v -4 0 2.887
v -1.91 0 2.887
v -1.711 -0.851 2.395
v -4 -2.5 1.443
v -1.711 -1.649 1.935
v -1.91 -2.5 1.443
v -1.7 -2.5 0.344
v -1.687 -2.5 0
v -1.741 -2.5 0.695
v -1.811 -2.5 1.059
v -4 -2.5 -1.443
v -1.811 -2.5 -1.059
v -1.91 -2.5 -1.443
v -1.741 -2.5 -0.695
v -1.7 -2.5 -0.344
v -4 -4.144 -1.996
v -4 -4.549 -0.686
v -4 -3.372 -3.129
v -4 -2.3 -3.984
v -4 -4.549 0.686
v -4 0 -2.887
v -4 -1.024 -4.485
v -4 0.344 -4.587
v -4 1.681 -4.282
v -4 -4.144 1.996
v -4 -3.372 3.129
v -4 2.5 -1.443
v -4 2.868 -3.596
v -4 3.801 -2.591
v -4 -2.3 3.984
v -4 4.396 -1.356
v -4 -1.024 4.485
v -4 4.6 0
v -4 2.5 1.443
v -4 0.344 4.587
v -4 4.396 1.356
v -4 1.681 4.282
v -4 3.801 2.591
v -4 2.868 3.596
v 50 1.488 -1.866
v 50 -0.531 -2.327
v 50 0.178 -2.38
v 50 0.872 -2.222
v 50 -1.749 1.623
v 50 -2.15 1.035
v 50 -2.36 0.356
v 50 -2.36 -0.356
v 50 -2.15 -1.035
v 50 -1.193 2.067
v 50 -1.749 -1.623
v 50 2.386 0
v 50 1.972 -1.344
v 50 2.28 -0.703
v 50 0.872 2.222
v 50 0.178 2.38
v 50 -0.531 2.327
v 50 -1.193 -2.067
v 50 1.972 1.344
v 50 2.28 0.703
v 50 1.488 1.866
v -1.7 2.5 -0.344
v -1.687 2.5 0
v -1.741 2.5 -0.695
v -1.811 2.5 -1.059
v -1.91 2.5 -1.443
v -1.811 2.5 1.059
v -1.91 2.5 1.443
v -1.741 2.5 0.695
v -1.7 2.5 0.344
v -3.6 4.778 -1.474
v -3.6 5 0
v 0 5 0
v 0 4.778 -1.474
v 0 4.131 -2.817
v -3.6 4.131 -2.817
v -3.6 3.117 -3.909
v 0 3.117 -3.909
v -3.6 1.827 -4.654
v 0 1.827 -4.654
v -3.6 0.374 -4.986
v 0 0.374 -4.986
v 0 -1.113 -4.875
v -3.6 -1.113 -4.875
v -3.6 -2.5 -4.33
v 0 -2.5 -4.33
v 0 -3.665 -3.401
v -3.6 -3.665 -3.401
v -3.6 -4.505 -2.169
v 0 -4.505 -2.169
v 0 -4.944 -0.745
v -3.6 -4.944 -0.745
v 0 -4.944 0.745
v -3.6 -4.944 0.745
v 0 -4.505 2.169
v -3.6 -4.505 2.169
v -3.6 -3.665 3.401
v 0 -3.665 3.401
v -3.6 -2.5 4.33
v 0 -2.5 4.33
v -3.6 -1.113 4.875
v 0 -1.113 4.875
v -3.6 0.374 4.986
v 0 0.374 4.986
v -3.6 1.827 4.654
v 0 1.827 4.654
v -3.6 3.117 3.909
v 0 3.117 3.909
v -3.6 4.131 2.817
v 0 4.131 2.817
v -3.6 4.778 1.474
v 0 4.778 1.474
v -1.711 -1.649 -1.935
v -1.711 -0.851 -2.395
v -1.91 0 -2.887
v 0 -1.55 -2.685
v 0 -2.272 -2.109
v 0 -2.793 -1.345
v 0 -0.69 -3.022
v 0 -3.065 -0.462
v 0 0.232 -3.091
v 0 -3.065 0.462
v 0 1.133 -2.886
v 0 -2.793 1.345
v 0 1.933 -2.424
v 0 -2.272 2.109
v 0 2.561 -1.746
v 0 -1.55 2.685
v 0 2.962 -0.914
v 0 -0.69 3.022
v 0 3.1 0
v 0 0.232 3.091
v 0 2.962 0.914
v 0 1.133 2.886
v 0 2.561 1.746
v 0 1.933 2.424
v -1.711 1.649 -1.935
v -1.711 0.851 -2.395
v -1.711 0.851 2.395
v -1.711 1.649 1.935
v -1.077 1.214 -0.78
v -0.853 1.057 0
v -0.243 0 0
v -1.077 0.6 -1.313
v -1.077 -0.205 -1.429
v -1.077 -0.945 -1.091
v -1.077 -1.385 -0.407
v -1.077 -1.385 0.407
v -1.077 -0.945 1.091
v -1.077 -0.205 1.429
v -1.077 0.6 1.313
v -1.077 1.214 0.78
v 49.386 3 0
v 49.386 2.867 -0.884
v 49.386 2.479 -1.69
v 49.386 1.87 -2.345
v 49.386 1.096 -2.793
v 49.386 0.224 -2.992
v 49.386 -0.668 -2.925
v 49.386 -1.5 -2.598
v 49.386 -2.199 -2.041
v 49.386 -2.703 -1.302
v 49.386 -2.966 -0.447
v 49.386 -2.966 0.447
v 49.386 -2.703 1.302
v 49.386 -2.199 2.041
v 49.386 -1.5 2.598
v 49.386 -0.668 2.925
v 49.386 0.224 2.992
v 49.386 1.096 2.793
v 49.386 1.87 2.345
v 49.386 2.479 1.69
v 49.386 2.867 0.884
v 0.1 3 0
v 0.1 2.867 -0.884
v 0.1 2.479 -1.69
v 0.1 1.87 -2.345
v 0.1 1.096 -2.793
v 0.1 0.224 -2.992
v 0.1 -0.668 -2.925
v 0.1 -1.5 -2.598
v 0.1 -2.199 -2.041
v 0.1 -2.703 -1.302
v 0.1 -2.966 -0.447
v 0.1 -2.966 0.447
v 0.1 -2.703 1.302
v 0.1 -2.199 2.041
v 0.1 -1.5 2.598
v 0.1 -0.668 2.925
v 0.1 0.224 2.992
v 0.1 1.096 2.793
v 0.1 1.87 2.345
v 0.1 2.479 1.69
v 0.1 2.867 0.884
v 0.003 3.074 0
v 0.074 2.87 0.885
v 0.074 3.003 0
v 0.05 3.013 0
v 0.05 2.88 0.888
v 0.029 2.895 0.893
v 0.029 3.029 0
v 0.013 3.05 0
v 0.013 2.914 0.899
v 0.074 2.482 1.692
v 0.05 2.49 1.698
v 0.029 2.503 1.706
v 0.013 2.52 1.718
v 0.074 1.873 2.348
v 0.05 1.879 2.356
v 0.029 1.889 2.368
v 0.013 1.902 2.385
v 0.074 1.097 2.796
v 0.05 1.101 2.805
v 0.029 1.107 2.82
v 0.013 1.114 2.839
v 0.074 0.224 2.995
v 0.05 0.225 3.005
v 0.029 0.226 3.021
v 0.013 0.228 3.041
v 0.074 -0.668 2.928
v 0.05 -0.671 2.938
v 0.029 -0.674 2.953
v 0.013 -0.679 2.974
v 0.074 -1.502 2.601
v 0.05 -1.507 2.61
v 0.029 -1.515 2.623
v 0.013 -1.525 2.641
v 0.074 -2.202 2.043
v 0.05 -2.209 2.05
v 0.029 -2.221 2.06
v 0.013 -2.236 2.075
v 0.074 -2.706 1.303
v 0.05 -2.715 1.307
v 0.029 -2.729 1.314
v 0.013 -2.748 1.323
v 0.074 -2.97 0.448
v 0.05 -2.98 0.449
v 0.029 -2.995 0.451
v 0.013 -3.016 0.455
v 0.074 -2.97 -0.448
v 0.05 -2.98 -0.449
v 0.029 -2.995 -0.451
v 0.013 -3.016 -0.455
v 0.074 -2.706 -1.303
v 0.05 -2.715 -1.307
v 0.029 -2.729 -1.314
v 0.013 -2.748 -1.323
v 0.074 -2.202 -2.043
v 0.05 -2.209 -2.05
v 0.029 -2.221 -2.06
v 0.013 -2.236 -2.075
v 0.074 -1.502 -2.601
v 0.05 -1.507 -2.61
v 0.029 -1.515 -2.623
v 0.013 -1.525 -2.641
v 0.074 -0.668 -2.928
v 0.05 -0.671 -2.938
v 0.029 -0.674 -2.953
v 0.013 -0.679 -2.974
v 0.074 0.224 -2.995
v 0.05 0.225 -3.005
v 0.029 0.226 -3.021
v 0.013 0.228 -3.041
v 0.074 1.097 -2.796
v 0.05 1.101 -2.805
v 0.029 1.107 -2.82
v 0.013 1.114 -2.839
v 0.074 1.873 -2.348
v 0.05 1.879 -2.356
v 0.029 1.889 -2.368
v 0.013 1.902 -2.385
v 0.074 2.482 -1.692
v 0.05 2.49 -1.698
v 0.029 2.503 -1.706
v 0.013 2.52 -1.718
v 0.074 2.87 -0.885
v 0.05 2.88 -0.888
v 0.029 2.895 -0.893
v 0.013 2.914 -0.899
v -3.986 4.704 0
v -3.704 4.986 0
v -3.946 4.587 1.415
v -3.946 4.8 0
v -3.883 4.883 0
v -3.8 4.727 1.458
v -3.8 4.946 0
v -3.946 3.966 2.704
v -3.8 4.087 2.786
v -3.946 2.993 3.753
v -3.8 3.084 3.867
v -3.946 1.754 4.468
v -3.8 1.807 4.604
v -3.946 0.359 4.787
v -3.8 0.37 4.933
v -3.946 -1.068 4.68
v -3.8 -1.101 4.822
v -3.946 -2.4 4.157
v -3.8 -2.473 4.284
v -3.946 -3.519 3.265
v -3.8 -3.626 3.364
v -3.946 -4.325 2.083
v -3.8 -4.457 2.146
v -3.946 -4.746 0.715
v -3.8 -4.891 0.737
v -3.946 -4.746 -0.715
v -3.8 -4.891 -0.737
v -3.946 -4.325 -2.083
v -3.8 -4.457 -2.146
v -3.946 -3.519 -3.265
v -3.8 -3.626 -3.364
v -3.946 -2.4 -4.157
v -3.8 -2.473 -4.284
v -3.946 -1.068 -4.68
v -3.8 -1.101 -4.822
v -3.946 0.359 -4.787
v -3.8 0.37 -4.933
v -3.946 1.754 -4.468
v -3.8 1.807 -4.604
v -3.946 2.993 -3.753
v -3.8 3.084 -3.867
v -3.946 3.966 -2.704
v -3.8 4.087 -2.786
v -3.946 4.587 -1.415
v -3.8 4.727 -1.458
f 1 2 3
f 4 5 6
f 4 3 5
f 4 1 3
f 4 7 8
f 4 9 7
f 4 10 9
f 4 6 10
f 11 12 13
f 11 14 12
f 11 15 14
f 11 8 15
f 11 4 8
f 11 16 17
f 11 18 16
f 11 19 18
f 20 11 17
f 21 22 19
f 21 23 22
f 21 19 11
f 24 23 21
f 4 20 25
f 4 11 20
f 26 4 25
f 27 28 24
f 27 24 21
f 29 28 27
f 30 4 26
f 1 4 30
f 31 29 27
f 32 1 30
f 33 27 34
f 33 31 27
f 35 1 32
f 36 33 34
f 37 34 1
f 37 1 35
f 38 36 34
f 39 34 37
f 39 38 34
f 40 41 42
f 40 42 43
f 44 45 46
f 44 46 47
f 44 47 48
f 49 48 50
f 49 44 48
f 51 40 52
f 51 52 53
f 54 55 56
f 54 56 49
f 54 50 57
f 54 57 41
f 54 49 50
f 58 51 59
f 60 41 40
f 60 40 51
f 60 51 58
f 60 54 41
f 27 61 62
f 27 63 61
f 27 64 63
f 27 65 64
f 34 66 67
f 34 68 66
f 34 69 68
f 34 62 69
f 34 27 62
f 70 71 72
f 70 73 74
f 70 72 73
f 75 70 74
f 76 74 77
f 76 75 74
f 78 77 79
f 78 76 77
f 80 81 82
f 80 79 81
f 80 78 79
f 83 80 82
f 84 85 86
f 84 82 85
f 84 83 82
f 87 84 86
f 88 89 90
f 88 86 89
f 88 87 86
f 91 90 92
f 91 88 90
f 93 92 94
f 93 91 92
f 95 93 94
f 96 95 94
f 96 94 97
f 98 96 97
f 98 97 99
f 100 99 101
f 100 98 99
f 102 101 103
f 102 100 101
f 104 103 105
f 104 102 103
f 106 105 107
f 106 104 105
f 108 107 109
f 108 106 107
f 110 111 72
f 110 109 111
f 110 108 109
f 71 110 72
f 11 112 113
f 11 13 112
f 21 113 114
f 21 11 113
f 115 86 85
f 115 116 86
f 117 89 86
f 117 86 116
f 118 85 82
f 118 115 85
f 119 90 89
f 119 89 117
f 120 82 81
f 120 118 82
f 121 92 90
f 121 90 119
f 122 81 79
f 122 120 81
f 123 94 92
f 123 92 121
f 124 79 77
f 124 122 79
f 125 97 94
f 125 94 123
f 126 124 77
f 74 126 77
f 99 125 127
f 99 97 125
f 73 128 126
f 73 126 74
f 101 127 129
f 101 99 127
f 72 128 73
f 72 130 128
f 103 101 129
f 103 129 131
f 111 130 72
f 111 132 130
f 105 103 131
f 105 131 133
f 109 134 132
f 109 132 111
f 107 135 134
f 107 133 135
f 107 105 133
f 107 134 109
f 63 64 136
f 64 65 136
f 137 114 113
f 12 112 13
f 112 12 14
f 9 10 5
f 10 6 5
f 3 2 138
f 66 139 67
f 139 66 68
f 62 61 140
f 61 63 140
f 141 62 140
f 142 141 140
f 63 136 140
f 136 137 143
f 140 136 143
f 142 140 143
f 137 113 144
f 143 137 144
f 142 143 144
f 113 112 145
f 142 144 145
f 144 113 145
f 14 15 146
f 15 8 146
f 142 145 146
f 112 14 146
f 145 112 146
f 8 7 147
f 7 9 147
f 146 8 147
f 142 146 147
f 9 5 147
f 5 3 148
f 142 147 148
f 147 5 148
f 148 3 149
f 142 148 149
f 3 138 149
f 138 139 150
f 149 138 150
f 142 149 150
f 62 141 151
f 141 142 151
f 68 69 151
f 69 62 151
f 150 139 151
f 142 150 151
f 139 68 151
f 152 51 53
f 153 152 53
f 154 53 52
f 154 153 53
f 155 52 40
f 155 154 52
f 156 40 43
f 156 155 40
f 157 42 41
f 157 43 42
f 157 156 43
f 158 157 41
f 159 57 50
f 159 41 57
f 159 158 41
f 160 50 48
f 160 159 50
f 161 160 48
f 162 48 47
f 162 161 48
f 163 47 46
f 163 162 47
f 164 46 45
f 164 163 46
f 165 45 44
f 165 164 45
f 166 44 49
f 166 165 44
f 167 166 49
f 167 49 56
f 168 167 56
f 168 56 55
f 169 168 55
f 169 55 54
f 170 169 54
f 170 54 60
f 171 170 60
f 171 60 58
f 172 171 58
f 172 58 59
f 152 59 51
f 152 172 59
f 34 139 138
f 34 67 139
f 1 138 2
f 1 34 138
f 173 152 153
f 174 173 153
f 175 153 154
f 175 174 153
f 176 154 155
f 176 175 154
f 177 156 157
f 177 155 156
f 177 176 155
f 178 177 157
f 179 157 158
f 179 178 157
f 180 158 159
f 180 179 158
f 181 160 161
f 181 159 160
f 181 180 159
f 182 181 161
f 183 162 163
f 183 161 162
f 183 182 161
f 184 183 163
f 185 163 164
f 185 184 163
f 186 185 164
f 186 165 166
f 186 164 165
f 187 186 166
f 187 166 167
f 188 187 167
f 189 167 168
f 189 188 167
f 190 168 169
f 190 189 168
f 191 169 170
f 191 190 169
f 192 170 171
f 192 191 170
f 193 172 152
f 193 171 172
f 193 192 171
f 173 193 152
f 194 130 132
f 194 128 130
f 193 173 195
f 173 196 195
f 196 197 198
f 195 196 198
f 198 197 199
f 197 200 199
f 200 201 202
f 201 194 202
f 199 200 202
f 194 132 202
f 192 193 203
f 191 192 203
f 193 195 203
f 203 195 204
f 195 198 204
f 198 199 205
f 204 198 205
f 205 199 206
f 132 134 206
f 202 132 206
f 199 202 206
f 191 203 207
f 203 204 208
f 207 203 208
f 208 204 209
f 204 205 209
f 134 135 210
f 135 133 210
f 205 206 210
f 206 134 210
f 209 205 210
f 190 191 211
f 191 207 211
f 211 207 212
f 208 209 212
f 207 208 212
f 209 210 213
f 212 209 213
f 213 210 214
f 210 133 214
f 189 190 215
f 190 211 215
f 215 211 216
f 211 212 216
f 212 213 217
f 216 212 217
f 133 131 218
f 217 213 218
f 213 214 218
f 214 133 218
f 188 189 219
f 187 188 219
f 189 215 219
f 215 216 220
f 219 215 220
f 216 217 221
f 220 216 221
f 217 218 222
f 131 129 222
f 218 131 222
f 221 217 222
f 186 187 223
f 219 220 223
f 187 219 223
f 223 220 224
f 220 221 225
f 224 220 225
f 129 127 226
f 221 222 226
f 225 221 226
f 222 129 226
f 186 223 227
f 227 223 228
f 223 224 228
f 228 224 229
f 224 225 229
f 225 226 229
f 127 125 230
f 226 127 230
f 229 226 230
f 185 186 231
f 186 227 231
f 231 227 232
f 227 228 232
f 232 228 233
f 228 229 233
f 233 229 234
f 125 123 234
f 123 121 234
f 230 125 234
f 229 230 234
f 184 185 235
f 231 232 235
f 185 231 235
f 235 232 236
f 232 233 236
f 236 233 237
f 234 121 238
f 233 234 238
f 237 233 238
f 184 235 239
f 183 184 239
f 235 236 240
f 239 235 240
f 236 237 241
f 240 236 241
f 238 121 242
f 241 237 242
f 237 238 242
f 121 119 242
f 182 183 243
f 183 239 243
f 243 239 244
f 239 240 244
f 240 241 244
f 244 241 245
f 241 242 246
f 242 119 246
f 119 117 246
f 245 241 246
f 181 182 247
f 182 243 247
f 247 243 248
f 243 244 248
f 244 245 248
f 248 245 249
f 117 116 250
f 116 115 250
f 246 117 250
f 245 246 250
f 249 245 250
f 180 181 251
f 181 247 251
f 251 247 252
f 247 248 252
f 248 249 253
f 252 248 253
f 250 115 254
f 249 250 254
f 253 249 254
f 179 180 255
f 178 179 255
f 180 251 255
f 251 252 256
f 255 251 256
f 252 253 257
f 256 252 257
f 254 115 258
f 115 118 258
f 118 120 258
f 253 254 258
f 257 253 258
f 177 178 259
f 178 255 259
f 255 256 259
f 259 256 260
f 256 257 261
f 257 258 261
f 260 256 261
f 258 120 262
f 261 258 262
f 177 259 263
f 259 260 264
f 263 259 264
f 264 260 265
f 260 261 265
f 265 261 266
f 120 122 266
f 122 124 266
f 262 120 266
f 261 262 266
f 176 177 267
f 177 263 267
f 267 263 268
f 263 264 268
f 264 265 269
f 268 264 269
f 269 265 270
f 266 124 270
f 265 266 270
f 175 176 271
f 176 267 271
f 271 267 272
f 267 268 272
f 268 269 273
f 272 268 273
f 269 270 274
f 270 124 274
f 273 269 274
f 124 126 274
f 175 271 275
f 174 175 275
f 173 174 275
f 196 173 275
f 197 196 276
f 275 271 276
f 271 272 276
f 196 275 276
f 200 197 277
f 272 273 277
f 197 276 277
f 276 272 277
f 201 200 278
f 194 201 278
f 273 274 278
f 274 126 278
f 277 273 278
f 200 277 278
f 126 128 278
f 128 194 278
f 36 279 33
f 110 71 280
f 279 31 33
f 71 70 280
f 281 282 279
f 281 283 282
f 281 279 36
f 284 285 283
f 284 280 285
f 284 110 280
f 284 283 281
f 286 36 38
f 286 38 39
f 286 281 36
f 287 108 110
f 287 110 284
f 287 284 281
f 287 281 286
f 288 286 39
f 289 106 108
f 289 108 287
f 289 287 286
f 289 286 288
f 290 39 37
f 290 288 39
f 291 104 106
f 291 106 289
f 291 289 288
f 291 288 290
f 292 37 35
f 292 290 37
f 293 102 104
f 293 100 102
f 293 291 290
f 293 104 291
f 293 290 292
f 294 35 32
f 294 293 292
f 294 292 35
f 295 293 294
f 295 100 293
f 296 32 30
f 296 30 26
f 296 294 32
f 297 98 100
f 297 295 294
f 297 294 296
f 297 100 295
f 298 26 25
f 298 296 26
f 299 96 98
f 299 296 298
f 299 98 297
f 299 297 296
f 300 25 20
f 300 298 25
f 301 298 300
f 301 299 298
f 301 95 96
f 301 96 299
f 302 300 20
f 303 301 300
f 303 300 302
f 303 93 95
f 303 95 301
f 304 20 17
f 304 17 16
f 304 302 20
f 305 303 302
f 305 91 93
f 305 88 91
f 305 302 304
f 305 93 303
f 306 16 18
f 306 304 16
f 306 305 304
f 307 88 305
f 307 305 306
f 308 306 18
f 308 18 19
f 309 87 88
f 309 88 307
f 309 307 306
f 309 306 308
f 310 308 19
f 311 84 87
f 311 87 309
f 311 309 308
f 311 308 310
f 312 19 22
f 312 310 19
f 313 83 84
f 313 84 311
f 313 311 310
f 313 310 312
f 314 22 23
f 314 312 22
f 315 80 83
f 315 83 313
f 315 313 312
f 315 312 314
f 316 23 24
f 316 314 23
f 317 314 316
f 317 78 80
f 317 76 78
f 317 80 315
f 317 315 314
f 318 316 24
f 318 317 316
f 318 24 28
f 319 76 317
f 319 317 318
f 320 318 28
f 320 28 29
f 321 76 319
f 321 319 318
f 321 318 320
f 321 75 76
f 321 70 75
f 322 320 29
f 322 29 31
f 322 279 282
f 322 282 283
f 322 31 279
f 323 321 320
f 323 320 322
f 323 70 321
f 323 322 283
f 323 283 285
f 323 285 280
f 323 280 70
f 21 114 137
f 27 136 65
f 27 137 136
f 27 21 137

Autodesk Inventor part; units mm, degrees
ref_plane "YZ Plane" through (0, 0, 0) normal (1, 0, 0) x (0, 1, 0)
ref_plane "XZ Plane" through (0, 0, 0) normal (0, 1, 0) x (-1, 0, 0)
sketch "Sketch1" plane through (0, 0, 0) normal (0, 0, 1) x (1, 0, 0)
  line L0 (-0.2433, 0) -> (50, 0)
  line L1 (50, 0) -> (50, 3)
  line L2 (50, 3) -> (26, 3)
  line L3 (26, 3) -> (25.3864, 3)
  line L4 (25.3864, 3) -> (0, 3)
  line L5 (0, 3) -> (0, 5)
  line L6 (0, 5) -> (-4, 5)
  line L7 (-4, 5) -> (-4, 2.8868)
  line L8 (-4, 2.8868) -> (-1.91, 2.8868)
  line L9 (-1.91, 2.8868) -> (-0.2433, 0)
  line L10 (-14.8, 0) -> (60.8, 0) projected
  line L11 (0, -1) -> (0, 6) projected
  line L12 (26, 3) -> (0, 3) construction
  dimension "d1" = 24
  dimension "d2" = 0.6136
  dimension "d3" = 4
  dimension "d4" = 2.09
  dimension "d5" = 60
  dimension "d6" = 6
  dimension "d7" = 6
  dimension "d8" = 5.7735
  dimension "d9" = 10
  dimension "d26" = 50
revolve "Body" add sketch "Sketch1" angle 360 about axis through (-0.2433, 0, 0) along (1, 0, 0)
sketch "Sketch2" plane through (-4, 0, 0) normal (-1, 0, 0) x (0, 0, 1)
  circle A0 centre (0, 0) radius 2.8868 projected
  line L0 (0, -7) -> (0, 7) projected
  line L1 (-7, 0) -> (7, 0) projected
  line L2 (2.8868, 0) -> (1.4434, -2.5)
  line L3 (1.4434, -2.5) -> (-1.4434, -2.5)
  line L4 (-1.4434, -2.5) -> (-2.8868, 0)
  line L5 (-2.8868, 0) -> (-1.4434, 2.5)
  line L6 (-1.4434, 2.5) -> (1.4434, 2.5)
  line L7 (1.4434, 2.5) -> (2.8868, 0)
extrude "Slot" add sketch "Sketch2" against normal up to next contours L7 A0 | A0 L2 | L6 L0 A0 | A0 L0 L3 | L0 L6 A0 | A0 L3 L0 | L4 A0 | A0 L5
fillet "Fillet1" radius 0.4 1 edges at (-4, -5, 0)
thread "Thread" size "M6x1" class "6g" standard "ISO Metric profile" length 24
chamfer "Chamfer1" distance 0.6135 distance2 0.6135 1 edges at (50, -3, 0) measured on face at (50, -0.7485, -0.2663)
ref_plane "Work Plane1" through (29, 0, 0) normal (0, -1, 0) x (1, 0, 0)
fillet "Fillet2" radius 0.1 1 edges at (0, -3, 0)
equation "\"d1\" = GEL"
equation "\"d3\" = KOH"
equation "\"d4\" = INTI"
equation "\"d6\" = GD"
equation "\"d7\" = BDM"
equation "\"d8\" = 1.1547 * SW"
equation "\"d9\" = KOD"
equation "\"d26\" = NLG"
equation "\"d30\" = R"
equation "\"d17\" = RR"
equation "\"d13\" = GEL"
equation "\"d15\" = -0.5 * SPD + 0.5 * GD"
equation "\"d16\" = GUL"
equation "\"GD\" = NND"
equation "\"NLG\" = 50"
equation "\"GEL\" = 24"
equation "\"KOD\" = 10"
equation "\"KOH\" = 4"
equation "\"INTI\" = 2.09"
equation "\"GAL\" = 0.61345 * PTC"
equation "\"GUL\" = 0.61345 * PTC"
equation "\"BDM\" = NND"
equation "\"SW\" = 5"
equation "\"RR\" = 0.4"
equation "\"SPD\" = NND - 1.2269 * PTC"
equation "\"R\" = 0.1"
equation "\"PHH\" = 0.4"
equation "\"GD1\" = THREADDIA - 1.2269 * PTC"
equation "\"THREADDIA\" = 6"
equation "\"FAWI\" = 45deg"
equation "\"PTC\" = 1"
equation "\"NND\" = 6"
equation "\"FAWI1\" = 30deg"
equation "\"TOA\" = 30deg"
equation "\"E0\" = 1.155 * SW"
properties part number "Unbrako - M6 x 50" material "Steel, Mild"
